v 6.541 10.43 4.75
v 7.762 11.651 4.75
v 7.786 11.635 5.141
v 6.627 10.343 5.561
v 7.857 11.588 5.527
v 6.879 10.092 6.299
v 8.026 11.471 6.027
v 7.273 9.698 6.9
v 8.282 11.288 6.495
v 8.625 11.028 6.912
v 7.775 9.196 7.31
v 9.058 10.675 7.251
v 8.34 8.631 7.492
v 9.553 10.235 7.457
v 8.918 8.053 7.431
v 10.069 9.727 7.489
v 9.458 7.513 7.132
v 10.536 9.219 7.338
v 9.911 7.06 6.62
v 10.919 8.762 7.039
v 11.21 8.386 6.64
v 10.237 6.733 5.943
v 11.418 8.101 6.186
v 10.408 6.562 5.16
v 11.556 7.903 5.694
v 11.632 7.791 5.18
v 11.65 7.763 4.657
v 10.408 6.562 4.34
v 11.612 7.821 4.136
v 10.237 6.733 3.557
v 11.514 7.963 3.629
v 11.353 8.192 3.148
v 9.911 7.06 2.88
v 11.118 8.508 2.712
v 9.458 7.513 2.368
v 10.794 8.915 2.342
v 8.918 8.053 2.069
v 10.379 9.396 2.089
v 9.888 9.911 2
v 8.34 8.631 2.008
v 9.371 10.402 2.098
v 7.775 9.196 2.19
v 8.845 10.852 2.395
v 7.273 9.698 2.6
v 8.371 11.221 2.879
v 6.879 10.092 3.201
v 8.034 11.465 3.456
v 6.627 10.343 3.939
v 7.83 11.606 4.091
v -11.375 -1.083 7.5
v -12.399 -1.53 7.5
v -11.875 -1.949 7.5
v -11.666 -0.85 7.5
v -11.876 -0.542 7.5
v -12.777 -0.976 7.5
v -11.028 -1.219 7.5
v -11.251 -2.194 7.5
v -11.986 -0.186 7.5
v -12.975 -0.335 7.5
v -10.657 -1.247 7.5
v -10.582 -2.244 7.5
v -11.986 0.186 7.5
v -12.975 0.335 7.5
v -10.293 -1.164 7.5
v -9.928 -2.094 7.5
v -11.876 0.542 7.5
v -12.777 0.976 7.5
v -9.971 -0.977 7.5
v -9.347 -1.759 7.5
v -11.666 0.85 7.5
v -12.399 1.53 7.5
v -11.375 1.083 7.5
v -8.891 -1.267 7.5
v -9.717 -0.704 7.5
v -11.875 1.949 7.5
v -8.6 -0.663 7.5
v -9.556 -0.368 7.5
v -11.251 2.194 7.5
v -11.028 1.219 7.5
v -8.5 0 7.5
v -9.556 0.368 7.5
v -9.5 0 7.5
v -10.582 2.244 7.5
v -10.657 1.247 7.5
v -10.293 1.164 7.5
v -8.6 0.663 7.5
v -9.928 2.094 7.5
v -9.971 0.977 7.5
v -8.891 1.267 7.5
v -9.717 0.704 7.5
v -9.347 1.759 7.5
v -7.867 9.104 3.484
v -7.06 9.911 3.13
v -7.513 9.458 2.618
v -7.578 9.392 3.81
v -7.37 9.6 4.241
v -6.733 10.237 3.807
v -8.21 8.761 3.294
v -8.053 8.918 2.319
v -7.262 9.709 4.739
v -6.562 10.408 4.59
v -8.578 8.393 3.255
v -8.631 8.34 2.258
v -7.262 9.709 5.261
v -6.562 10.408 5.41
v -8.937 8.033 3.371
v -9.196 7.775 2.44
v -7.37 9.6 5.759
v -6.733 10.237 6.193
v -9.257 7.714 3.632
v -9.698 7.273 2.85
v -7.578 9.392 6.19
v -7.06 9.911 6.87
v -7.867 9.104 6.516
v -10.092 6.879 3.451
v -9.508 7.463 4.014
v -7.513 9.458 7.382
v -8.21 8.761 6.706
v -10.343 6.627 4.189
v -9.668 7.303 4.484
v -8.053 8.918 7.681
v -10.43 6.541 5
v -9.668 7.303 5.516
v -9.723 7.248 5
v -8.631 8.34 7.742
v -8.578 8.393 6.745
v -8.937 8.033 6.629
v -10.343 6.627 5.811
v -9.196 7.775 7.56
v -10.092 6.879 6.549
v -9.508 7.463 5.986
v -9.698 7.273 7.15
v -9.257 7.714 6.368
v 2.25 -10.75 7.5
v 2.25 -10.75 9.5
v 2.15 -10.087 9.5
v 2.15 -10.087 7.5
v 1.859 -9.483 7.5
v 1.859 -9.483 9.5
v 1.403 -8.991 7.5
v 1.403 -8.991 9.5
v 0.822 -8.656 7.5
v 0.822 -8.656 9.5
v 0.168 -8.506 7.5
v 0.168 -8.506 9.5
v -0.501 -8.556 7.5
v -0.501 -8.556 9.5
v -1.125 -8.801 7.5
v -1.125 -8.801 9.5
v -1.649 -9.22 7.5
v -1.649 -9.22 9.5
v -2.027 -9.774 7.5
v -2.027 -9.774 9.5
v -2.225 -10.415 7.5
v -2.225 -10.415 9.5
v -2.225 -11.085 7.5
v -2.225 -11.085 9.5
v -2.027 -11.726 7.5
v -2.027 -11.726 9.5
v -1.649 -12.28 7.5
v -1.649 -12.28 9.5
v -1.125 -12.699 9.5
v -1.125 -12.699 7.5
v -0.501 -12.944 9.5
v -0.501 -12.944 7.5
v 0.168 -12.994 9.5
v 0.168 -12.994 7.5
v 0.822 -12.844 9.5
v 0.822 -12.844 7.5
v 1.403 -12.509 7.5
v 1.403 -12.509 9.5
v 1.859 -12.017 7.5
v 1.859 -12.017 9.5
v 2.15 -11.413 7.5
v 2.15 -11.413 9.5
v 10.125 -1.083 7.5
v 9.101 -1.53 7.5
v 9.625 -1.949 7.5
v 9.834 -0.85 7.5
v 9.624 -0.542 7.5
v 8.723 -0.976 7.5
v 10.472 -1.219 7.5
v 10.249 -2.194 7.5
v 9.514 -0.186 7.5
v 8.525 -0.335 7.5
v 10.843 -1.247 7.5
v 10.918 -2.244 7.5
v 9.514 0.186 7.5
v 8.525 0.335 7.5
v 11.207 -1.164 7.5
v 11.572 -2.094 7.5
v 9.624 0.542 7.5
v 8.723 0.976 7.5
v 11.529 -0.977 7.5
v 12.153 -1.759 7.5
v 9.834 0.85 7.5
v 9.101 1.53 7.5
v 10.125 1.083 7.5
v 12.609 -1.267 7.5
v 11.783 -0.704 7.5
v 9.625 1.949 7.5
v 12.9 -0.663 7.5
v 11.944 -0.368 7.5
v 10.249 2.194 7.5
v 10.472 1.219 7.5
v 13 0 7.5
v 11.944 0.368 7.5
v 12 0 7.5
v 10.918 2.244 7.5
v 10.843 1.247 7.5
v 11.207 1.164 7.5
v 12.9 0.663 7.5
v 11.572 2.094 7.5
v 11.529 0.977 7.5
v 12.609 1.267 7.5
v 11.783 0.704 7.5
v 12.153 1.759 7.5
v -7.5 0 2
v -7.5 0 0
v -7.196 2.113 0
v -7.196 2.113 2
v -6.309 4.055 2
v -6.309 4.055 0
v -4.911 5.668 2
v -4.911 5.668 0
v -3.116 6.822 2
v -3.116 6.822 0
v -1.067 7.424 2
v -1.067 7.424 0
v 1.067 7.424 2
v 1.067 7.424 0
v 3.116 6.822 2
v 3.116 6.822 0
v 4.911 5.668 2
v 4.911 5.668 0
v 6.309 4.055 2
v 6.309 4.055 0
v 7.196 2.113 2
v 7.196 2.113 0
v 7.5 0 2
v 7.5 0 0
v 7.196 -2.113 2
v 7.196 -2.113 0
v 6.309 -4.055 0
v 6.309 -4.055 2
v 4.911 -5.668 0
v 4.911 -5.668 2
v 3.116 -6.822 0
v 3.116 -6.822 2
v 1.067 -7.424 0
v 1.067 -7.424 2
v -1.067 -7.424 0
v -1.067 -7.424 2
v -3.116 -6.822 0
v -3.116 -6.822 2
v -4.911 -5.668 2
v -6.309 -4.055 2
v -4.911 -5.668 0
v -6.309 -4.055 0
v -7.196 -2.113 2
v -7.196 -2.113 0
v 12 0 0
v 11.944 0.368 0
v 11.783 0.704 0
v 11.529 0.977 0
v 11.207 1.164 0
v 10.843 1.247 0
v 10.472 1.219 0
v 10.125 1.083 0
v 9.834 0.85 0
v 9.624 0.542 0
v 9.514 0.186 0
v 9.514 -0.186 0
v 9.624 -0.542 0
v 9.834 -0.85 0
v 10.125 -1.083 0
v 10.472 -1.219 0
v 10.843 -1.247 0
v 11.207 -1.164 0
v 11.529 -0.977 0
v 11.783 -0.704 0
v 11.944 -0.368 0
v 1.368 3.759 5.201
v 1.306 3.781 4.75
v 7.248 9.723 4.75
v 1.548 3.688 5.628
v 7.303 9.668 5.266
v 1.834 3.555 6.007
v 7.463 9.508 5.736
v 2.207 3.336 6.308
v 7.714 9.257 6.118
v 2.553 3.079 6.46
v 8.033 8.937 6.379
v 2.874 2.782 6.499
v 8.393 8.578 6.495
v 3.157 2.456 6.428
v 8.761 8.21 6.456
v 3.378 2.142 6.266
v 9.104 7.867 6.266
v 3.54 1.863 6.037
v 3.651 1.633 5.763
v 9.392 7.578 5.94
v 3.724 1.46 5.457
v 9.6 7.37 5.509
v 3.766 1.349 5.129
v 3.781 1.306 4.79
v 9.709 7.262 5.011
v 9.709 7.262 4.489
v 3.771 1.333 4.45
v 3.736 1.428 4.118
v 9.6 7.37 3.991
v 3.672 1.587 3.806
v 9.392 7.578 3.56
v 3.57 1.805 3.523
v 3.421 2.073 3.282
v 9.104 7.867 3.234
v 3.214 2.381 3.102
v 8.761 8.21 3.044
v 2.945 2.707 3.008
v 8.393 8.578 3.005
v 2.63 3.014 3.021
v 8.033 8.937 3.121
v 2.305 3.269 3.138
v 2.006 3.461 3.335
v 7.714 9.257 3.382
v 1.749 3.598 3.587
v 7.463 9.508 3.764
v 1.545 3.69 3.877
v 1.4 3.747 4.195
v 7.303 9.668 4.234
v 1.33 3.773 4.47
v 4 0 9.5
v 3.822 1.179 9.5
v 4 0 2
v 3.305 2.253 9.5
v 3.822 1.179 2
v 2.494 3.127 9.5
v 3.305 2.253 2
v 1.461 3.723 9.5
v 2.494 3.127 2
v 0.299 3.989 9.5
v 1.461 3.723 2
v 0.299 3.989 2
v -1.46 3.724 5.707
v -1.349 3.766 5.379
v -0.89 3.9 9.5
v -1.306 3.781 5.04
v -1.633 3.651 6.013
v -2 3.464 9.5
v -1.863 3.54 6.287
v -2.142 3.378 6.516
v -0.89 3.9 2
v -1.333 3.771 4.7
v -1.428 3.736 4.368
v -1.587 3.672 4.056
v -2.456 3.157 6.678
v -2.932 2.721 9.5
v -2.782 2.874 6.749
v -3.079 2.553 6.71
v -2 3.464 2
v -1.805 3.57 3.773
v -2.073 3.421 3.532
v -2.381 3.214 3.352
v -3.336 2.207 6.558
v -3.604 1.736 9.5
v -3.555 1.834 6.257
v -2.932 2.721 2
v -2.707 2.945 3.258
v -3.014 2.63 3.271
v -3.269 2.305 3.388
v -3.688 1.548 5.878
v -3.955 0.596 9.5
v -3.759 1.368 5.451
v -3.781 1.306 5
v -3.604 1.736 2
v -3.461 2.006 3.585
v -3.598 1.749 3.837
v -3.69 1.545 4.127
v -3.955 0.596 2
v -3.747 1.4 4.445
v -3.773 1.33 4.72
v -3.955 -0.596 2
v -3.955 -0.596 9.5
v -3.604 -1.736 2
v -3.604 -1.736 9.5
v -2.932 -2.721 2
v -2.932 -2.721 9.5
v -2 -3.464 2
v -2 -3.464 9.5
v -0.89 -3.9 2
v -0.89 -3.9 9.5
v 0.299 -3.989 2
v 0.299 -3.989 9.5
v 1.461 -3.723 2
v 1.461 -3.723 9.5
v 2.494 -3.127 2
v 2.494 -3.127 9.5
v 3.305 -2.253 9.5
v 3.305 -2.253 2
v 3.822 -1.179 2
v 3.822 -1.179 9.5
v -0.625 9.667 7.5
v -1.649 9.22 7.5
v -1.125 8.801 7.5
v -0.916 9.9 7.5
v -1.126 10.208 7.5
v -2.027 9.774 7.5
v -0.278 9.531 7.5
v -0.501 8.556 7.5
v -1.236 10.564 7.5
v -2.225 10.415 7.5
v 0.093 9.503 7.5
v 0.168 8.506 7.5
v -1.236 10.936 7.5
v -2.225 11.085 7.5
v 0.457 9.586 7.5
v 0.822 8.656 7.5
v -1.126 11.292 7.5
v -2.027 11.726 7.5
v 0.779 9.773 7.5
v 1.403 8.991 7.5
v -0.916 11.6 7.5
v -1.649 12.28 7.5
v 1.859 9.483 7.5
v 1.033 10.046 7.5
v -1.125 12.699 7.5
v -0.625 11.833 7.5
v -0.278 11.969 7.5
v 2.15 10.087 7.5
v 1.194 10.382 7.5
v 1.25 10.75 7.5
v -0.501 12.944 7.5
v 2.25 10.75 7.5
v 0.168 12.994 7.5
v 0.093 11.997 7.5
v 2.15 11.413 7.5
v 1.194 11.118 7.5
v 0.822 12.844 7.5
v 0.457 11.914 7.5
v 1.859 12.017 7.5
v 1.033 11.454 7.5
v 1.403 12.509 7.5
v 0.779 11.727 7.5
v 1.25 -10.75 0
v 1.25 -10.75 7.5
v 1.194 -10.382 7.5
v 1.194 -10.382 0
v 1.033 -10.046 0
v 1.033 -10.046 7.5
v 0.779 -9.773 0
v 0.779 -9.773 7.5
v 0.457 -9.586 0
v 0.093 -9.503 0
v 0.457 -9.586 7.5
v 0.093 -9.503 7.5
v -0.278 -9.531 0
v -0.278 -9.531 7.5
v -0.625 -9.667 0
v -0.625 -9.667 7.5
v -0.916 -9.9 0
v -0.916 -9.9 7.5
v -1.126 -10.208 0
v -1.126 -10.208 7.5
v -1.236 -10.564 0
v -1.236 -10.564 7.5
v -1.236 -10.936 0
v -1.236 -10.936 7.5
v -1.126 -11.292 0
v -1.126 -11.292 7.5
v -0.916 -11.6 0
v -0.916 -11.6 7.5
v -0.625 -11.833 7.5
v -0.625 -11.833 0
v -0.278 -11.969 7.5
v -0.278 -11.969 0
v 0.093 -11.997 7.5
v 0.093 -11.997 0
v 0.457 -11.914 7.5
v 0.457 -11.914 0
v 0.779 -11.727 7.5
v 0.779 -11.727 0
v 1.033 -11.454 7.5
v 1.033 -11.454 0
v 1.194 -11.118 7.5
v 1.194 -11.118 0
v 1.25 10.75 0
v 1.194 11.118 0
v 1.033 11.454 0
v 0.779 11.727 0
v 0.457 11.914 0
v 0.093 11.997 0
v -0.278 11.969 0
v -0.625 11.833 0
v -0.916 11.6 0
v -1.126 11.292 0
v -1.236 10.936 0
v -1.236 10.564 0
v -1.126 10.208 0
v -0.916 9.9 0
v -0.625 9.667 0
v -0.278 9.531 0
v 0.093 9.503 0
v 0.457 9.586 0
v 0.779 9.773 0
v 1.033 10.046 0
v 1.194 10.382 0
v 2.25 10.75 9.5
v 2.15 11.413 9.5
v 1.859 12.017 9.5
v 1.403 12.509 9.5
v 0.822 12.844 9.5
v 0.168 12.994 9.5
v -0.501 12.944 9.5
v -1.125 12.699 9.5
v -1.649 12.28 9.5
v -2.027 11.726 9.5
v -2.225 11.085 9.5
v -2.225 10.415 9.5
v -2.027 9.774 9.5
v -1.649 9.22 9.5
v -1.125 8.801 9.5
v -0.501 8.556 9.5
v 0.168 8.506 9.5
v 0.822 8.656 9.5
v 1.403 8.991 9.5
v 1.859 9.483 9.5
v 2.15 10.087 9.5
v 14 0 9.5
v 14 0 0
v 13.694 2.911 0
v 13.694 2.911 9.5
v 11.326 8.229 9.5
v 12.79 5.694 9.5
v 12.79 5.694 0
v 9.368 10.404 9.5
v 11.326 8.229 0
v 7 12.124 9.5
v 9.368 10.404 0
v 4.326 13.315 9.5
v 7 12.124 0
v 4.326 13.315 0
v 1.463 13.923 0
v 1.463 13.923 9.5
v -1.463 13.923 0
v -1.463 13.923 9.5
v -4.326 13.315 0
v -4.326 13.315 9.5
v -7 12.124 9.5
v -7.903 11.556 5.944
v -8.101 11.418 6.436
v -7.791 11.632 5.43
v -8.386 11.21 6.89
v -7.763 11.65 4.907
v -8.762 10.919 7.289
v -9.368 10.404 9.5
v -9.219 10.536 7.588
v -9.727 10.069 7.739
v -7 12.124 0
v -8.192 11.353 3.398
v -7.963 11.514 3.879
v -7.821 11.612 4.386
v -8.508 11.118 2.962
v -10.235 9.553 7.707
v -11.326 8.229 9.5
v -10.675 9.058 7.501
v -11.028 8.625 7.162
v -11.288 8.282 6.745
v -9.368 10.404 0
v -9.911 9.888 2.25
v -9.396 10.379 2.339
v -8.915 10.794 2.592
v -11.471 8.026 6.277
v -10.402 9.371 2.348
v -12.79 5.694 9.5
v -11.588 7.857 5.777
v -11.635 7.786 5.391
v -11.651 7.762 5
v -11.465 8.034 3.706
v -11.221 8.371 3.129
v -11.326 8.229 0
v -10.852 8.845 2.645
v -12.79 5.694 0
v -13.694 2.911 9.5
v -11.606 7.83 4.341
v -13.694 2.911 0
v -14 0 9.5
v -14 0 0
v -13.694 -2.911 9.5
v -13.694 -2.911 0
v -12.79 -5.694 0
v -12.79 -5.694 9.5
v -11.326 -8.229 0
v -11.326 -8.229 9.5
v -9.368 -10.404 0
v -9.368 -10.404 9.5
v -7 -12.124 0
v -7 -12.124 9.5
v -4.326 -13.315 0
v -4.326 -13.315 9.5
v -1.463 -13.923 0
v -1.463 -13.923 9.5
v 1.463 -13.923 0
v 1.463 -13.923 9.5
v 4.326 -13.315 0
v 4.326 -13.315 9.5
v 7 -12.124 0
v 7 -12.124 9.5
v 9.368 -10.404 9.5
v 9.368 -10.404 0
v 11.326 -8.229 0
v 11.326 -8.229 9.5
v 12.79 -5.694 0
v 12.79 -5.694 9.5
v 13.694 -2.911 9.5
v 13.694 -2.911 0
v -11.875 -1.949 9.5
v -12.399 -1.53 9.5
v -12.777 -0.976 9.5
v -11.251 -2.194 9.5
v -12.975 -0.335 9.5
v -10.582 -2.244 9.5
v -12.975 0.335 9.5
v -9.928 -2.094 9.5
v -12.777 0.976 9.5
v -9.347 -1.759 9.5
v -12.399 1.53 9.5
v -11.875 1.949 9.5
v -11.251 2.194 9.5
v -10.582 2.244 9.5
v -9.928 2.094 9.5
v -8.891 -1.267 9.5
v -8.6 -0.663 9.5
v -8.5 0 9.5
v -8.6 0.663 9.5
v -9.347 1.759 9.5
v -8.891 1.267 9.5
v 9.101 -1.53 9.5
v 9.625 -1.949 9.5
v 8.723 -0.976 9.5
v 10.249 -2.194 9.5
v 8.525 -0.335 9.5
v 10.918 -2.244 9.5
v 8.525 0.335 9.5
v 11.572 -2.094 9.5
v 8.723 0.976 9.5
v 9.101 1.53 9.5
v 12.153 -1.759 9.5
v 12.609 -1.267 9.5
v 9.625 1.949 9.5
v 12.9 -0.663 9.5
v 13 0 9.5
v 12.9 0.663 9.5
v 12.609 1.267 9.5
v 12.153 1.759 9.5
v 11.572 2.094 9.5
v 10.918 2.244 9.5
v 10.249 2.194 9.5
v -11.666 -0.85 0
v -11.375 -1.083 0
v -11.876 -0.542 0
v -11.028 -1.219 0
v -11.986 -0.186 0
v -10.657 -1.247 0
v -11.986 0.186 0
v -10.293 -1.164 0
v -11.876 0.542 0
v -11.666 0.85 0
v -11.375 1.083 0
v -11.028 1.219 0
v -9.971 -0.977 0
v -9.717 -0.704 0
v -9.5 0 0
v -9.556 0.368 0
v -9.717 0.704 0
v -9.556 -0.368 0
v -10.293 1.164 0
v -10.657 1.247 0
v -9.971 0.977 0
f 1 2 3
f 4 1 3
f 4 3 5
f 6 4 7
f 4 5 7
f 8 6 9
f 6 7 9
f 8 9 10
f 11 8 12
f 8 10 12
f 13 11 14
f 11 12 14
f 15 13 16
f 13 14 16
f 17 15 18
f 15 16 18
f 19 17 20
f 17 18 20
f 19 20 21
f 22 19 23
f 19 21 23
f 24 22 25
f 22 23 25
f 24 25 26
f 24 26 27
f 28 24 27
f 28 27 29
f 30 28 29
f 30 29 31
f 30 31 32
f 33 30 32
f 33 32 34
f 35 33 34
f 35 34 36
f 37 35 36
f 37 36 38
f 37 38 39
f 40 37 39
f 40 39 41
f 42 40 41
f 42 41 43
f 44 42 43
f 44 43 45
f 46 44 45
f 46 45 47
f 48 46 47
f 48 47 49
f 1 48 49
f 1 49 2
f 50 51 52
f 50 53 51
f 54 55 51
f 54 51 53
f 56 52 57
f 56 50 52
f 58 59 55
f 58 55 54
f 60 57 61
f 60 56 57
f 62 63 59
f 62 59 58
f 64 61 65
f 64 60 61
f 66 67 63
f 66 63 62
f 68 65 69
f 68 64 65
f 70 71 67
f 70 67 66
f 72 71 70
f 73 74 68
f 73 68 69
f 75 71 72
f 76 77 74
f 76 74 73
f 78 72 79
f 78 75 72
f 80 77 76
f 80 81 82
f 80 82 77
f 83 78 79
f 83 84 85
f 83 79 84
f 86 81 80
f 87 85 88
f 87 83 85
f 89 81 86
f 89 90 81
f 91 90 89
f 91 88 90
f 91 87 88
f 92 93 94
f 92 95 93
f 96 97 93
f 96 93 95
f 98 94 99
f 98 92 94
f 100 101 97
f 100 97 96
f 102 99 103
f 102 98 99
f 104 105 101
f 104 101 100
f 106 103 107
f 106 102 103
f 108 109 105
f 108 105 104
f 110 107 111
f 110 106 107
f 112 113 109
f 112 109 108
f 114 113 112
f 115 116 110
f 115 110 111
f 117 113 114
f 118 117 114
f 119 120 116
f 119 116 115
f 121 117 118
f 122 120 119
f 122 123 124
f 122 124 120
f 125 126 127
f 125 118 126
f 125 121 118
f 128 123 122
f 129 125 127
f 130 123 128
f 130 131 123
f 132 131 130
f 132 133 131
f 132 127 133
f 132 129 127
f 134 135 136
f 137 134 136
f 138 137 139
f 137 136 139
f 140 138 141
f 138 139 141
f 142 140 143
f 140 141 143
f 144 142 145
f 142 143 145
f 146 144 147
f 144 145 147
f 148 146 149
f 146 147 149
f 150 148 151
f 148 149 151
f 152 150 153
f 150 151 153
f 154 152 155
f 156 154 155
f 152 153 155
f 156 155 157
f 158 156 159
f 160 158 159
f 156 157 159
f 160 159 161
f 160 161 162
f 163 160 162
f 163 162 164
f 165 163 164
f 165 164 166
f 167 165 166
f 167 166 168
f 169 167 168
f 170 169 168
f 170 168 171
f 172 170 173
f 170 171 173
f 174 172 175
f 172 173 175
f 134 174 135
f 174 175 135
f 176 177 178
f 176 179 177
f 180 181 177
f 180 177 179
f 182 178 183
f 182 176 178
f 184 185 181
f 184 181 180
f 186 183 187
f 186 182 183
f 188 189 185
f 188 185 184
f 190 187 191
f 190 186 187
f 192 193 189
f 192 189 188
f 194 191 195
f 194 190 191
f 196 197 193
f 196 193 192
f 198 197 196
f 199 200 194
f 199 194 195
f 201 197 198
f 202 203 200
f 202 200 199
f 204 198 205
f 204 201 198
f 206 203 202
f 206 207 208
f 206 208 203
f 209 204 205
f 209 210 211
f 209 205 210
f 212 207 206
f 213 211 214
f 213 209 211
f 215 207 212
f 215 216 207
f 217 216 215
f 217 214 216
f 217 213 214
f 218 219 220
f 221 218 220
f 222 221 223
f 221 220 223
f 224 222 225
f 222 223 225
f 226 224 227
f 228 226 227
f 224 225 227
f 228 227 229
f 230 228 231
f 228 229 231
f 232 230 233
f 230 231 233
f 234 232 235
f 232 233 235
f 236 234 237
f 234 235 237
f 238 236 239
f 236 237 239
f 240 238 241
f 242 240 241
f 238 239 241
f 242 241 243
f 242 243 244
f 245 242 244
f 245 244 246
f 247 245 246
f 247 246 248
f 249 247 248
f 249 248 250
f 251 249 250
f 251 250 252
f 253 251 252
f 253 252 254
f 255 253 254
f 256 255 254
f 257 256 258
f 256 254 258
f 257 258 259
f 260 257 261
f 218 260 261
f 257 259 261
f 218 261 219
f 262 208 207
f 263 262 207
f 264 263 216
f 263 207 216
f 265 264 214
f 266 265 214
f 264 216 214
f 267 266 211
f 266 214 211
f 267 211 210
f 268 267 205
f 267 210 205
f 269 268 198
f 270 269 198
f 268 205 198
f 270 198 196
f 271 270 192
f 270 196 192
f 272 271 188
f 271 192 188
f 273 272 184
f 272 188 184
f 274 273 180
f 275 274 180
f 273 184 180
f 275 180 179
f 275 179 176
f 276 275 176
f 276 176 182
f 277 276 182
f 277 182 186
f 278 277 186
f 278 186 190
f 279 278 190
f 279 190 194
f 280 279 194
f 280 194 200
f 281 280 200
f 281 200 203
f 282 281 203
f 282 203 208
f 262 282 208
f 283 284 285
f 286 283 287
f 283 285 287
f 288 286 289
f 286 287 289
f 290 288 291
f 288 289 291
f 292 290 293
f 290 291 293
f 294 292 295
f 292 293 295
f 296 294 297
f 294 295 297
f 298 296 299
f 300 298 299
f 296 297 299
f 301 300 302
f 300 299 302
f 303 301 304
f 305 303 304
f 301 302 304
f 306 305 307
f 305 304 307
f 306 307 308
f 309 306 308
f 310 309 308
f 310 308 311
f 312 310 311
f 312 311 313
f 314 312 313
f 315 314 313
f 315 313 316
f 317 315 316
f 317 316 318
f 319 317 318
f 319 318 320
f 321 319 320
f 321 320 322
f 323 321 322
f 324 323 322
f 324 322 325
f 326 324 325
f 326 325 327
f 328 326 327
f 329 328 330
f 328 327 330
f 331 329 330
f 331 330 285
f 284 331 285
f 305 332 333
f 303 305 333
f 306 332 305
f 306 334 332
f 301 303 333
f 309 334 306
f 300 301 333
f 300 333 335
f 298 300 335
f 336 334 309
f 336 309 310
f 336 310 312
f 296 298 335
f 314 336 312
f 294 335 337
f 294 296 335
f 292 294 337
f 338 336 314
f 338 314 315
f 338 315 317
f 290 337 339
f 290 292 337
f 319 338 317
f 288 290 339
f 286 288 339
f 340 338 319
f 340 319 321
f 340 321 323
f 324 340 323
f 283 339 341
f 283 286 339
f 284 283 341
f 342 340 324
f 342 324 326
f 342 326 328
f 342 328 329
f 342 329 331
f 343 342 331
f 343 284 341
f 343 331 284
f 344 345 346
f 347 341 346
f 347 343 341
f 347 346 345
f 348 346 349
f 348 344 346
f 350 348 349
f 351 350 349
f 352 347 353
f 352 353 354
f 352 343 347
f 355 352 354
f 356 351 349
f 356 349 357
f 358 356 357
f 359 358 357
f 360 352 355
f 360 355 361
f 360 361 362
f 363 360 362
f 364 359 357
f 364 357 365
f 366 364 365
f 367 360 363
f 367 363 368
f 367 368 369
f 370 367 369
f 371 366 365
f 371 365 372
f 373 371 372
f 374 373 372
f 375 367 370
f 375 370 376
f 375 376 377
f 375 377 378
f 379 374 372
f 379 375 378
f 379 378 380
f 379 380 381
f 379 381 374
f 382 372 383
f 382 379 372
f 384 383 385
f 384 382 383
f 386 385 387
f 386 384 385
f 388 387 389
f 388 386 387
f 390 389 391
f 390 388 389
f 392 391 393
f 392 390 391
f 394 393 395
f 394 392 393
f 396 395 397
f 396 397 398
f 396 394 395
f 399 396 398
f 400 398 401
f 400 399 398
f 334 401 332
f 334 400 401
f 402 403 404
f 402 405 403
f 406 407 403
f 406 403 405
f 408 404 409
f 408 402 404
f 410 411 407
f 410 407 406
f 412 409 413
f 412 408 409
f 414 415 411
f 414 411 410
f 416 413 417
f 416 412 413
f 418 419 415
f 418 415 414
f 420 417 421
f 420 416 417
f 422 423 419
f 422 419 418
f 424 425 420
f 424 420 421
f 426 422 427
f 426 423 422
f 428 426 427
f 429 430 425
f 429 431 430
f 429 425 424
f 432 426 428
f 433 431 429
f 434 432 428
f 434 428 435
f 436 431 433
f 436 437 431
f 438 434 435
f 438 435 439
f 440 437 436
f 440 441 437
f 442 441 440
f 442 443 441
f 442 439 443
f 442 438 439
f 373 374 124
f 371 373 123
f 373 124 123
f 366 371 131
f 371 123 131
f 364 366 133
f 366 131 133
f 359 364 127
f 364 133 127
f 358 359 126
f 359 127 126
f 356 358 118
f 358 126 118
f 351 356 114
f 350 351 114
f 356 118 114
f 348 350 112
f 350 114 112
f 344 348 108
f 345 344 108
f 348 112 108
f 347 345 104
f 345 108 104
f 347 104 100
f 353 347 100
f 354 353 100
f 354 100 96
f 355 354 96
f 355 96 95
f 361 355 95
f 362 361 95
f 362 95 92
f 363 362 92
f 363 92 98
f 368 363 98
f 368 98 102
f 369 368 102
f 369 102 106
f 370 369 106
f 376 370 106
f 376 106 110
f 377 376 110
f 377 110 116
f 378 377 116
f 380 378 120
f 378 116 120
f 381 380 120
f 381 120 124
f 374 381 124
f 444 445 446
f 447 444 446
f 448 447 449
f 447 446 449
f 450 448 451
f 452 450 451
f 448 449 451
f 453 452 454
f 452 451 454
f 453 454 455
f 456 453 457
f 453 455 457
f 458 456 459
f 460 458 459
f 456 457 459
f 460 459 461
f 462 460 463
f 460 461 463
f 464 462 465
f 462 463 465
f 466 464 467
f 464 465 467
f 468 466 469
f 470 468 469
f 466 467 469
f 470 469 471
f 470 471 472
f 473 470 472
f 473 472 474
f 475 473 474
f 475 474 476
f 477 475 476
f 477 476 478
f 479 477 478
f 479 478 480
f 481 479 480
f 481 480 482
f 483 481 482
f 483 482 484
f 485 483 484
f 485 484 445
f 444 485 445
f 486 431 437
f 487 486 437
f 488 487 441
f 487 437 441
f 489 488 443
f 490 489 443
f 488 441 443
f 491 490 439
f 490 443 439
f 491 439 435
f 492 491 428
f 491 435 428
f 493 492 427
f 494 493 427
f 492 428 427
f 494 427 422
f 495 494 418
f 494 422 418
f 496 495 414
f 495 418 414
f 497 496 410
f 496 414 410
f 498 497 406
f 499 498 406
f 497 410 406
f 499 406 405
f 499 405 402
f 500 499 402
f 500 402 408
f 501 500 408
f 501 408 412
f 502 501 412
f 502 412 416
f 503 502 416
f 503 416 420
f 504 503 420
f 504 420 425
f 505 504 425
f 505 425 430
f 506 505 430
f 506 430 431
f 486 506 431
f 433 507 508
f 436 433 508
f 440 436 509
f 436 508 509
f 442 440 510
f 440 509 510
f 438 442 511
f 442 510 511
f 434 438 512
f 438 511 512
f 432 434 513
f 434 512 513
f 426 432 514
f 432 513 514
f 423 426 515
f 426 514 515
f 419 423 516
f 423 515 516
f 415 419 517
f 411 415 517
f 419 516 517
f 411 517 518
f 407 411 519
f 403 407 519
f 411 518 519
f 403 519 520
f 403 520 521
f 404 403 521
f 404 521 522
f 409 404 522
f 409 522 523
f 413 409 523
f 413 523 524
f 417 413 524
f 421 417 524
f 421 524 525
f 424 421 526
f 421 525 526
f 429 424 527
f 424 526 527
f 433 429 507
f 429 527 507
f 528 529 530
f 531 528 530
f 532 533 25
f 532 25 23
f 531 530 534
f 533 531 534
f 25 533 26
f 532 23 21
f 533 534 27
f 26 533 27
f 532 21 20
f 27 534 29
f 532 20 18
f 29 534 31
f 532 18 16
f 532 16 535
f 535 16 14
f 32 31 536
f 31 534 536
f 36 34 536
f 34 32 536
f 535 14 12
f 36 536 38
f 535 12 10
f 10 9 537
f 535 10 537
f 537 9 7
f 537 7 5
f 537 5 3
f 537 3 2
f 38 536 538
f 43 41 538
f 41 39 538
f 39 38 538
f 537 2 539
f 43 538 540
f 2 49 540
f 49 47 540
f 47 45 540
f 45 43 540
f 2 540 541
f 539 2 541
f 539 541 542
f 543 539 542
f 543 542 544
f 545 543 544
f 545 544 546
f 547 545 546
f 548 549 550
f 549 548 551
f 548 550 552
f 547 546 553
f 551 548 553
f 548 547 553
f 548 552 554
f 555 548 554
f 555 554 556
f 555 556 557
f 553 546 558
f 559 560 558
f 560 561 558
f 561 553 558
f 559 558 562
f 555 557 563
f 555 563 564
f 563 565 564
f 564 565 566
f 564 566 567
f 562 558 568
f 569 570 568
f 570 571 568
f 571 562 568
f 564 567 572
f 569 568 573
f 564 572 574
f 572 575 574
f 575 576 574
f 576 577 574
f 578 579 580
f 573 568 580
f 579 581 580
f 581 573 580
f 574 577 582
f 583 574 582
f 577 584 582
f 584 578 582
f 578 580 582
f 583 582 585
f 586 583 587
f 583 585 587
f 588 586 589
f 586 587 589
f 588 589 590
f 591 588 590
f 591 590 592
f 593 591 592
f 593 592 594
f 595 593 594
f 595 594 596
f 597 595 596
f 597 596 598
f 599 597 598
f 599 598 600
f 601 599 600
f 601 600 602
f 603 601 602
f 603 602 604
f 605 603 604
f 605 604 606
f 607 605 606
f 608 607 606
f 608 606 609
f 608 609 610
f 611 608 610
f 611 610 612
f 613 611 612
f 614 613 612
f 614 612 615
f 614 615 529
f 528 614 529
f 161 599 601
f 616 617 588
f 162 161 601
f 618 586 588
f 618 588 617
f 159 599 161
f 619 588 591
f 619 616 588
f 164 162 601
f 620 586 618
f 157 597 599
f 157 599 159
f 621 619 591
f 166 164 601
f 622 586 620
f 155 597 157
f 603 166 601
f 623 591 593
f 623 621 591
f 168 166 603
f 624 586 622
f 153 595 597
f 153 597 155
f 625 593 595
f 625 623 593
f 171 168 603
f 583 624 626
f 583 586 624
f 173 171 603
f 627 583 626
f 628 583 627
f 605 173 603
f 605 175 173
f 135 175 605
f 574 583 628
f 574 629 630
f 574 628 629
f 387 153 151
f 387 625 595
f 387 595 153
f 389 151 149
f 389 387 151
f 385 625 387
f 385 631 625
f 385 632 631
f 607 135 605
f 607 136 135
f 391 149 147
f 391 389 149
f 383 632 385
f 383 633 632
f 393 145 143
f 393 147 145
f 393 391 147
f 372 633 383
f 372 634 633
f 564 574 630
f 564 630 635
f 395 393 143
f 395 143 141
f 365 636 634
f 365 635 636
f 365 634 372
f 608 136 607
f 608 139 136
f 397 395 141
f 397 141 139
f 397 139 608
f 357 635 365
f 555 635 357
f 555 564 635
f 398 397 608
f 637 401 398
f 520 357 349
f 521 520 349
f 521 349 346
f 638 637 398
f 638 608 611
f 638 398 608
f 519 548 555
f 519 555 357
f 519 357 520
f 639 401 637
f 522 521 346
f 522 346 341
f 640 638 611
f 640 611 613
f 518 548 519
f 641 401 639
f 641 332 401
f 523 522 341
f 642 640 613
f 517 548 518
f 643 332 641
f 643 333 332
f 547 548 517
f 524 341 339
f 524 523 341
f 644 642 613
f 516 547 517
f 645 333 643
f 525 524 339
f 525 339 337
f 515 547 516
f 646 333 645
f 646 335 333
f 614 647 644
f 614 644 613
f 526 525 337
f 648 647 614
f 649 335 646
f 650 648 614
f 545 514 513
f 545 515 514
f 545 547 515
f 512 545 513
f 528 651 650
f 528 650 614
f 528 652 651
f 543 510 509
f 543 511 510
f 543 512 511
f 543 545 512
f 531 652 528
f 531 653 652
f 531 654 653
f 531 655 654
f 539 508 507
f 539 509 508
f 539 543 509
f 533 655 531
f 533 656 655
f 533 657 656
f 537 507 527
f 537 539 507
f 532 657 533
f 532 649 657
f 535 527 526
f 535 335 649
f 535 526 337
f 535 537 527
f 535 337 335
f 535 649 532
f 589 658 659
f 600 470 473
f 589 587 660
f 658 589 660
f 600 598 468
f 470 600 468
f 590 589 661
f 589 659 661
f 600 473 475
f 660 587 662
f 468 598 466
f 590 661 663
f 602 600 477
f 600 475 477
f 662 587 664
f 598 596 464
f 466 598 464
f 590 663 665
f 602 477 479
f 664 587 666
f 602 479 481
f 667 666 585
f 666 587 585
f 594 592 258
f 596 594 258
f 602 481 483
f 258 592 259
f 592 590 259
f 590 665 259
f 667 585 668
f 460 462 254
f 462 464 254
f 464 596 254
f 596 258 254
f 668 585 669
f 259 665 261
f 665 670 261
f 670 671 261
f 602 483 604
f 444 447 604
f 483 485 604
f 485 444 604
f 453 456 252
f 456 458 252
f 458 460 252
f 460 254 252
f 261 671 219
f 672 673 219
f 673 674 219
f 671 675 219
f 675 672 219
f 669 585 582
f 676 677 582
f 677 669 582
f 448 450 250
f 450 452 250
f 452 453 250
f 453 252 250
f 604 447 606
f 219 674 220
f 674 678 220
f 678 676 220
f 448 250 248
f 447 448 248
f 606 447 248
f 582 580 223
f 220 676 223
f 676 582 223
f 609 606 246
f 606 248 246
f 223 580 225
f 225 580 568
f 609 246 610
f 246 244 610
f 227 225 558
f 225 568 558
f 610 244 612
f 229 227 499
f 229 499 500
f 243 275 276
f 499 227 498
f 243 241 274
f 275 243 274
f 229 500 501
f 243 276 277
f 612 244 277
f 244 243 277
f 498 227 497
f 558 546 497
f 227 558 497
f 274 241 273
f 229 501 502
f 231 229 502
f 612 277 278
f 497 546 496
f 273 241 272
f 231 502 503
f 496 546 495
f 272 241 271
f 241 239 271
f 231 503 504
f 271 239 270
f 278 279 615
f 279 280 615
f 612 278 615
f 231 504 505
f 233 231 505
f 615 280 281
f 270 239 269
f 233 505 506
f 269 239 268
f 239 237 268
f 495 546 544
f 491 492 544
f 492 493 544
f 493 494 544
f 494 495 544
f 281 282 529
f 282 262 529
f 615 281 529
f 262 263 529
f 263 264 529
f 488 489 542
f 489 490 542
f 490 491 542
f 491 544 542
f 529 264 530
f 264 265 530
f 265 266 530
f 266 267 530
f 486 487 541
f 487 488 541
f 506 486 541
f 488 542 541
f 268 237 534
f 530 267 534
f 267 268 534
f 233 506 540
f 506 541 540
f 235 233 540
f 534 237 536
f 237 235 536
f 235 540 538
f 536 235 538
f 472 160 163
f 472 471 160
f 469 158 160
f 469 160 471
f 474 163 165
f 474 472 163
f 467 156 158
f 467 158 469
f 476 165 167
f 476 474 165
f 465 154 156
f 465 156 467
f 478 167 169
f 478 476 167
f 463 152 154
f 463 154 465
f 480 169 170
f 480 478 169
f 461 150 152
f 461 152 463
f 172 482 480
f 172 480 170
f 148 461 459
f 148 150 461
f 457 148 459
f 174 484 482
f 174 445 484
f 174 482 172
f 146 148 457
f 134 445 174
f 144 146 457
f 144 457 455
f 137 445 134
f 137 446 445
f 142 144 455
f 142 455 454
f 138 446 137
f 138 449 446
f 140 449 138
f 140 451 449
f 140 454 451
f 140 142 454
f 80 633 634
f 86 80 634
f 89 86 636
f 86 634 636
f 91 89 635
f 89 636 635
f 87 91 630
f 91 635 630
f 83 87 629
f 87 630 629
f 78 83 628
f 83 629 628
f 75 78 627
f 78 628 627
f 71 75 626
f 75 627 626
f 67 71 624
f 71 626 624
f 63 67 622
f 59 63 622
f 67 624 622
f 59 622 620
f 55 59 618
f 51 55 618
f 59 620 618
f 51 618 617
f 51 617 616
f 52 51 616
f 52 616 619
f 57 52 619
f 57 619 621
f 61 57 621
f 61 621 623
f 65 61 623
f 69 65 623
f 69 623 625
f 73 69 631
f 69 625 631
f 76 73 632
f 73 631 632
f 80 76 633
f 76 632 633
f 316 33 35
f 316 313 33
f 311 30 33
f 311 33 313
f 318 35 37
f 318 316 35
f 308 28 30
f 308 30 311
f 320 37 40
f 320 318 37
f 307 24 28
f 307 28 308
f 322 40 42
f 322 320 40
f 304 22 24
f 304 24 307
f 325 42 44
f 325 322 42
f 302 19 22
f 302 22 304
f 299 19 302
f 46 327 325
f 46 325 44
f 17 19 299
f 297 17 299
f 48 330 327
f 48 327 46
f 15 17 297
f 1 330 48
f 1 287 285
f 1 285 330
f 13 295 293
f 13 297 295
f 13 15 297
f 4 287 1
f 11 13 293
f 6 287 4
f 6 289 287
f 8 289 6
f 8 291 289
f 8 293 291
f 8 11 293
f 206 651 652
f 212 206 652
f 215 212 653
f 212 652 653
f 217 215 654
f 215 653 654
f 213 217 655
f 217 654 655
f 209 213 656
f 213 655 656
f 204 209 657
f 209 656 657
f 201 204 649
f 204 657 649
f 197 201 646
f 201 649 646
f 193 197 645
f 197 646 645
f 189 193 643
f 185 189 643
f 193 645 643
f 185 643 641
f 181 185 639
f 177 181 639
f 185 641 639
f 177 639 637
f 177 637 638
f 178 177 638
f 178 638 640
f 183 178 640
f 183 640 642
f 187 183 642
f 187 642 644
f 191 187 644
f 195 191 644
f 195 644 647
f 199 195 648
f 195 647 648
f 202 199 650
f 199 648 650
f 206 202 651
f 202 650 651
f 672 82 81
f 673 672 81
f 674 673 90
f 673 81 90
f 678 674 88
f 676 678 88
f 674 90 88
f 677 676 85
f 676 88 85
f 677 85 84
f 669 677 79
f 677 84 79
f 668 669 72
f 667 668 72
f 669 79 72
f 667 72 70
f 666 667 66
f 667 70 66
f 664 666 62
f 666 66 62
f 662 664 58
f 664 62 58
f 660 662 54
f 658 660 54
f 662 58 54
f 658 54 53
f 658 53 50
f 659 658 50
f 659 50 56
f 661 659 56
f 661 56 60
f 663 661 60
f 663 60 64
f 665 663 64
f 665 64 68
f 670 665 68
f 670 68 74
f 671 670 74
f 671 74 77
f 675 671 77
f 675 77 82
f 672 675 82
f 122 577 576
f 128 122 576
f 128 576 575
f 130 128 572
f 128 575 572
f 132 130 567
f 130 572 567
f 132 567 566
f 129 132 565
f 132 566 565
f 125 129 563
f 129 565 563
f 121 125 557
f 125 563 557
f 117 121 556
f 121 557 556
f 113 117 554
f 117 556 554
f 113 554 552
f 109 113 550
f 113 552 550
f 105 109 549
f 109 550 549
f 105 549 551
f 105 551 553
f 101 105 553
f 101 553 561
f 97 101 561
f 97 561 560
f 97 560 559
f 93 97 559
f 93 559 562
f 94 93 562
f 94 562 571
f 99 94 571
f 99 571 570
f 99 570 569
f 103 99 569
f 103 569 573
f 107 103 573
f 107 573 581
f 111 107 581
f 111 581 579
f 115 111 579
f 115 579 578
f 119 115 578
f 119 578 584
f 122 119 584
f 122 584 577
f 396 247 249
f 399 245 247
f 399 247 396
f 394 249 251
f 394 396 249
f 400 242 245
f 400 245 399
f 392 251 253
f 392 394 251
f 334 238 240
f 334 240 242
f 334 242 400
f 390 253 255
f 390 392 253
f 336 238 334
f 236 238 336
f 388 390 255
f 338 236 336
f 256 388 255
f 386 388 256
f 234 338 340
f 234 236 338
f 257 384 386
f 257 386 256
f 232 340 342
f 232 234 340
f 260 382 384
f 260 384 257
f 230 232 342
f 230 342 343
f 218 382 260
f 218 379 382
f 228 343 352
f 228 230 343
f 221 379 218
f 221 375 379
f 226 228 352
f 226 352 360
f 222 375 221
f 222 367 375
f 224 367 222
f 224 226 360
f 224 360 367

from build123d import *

# Parameters (mm, degrees)
SKETCH1_R           = 14
BOSS_EXTRUDE1_DEPTH = 2
SKETCH2_R           = 14
SKETCH2_R_2         = 4
BOSS_EXTRUDE2_DEPTH = 7.5
SKETCH3_R           = 7.5
CUT_EXTRUDE1_DEPTH  = 2
SKETCH5_R           = 1.25
CUT_EXTRUDE2_DEPTH  = 22.960191256
SKETCH7_R           = 1.75
CUT_EXTRUDE3_DEPTH  = 15
SKETCH9_R           = 1.75
CUT_EXTRUDE4_DEPTH  = 15
SKETCH10_R          = 2.25
CUT_EXTRUDE5_DEPTH  = 2
SKETCH11_R          = 2.75
CUT_EXTRUDE6_DEPTH  = 2
SKETCH12_R          = 2.75
CUT_EXTRUDE7_DEPTH  = 2


with BuildPart() as part:
    # Sketch1 → Boss-Extrude1 (new body)
    with BuildSketch(Plane.XY):
        Circle(SKETCH1_R)
    extrude(amount=BOSS_EXTRUDE1_DEPTH)

    # Sketch2 → Boss-Extrude2 (add)
    with BuildSketch(Plane.XY.offset(2)):
        Circle(SKETCH2_R)
        Circle(SKETCH2_R_2, mode=Mode.SUBTRACT)
    extrude(amount=BOSS_EXTRUDE2_DEPTH)

    # Sketch3 → Cut-Extrude1 (cut)
    with BuildSketch(Plane(origin=(0, 0, 0), x_dir=(-1, 0, 0), z_dir=(0, 0, -1))):
        Circle(SKETCH3_R)
    extrude(amount=-CUT_EXTRUDE1_DEPTH, mode=Mode.SUBTRACT)

    # Sketch5 → Cut-Extrude2 (cut, through all)
    with BuildSketch(Plane.XY.offset(9.5)):
        with Locations((0, 10.75)):
            Circle(SKETCH5_R)
        with Locations((10.75, 0)):
            Circle(SKETCH5_R)
        with Locations((0, -10.75)):
            Circle(SKETCH5_R)
        with Locations((-10.75, 0)):
            Circle(SKETCH5_R)
    extrude(amount=-CUT_EXTRUDE2_DEPTH, mode=Mode.SUBTRACT)

    # Sketch7 → Cut-Extrude3 (cut)
    with BuildSketch(Plane(origin=(9.899494937, 9.899494937, 0), x_dir=(0.7071067811865489, -0.7071067811865461, 0), z_dir=(0.7071067811865461, 0.7071067811865489, 0))):
        with Locations((0, -4.75)):
            Circle(SKETCH7_R)
    extrude(amount=-CUT_EXTRUDE3_DEPTH, mode=Mode.SUBTRACT)

    # Sketch9 → Cut-Extrude4 (cut)
    with BuildSketch(Plane(origin=(-9.899494937, 9.899494937, 0), x_dir=(0, 0, 1), z_dir=(-0.7071067811865489, 0.7071067811865462, 0))):
        with Locations((5, 0)):
            Circle(SKETCH9_R)
    extrude(amount=-CUT_EXTRUDE4_DEPTH, mode=Mode.SUBTRACT)

    # Sketch10 → Cut-Extrude5 (cut)
    with BuildSketch(Plane.XY.offset(9.5)):
        with Locations((0, 10.75)):
            Circle(SKETCH10_R)
        with Locations((10.75, 0)):
            Circle(SKETCH10_R)
        with Locations((0, -10.75)):
            Circle(SKETCH10_R)
        with Locations((-10.75, 0)):
            Circle(SKETCH10_R)
    extrude(amount=-CUT_EXTRUDE5_DEPTH, mode=Mode.SUBTRACT)

    # Sketch11 → Cut-Extrude6 (cut)
    with BuildSketch(Plane(origin=(9.899494937, 9.899494937, 0), x_dir=(0.7071067811865489, -0.7071067811865461, 0), z_dir=(0.7071067811865461, 0.7071067811865489, 0))):
        with Locations((0, -4.75)):
            Circle(SKETCH11_R)
    extrude(amount=-CUT_EXTRUDE6_DEPTH, mode=Mode.SUBTRACT)

    # Sketch12 → Cut-Extrude7 (cut)
    with BuildSketch(Plane(origin=(-9.899494937, 9.899494937, 0), x_dir=(0, 0, 1), z_dir=(-0.7071067811865489, 0.7071067811865462, 0))):
        with Locations((5, 0)):
            Circle(SKETCH12_R)
    extrude(amount=-CUT_EXTRUDE7_DEPTH, mode=Mode.SUBTRACT)


solid = part.part
